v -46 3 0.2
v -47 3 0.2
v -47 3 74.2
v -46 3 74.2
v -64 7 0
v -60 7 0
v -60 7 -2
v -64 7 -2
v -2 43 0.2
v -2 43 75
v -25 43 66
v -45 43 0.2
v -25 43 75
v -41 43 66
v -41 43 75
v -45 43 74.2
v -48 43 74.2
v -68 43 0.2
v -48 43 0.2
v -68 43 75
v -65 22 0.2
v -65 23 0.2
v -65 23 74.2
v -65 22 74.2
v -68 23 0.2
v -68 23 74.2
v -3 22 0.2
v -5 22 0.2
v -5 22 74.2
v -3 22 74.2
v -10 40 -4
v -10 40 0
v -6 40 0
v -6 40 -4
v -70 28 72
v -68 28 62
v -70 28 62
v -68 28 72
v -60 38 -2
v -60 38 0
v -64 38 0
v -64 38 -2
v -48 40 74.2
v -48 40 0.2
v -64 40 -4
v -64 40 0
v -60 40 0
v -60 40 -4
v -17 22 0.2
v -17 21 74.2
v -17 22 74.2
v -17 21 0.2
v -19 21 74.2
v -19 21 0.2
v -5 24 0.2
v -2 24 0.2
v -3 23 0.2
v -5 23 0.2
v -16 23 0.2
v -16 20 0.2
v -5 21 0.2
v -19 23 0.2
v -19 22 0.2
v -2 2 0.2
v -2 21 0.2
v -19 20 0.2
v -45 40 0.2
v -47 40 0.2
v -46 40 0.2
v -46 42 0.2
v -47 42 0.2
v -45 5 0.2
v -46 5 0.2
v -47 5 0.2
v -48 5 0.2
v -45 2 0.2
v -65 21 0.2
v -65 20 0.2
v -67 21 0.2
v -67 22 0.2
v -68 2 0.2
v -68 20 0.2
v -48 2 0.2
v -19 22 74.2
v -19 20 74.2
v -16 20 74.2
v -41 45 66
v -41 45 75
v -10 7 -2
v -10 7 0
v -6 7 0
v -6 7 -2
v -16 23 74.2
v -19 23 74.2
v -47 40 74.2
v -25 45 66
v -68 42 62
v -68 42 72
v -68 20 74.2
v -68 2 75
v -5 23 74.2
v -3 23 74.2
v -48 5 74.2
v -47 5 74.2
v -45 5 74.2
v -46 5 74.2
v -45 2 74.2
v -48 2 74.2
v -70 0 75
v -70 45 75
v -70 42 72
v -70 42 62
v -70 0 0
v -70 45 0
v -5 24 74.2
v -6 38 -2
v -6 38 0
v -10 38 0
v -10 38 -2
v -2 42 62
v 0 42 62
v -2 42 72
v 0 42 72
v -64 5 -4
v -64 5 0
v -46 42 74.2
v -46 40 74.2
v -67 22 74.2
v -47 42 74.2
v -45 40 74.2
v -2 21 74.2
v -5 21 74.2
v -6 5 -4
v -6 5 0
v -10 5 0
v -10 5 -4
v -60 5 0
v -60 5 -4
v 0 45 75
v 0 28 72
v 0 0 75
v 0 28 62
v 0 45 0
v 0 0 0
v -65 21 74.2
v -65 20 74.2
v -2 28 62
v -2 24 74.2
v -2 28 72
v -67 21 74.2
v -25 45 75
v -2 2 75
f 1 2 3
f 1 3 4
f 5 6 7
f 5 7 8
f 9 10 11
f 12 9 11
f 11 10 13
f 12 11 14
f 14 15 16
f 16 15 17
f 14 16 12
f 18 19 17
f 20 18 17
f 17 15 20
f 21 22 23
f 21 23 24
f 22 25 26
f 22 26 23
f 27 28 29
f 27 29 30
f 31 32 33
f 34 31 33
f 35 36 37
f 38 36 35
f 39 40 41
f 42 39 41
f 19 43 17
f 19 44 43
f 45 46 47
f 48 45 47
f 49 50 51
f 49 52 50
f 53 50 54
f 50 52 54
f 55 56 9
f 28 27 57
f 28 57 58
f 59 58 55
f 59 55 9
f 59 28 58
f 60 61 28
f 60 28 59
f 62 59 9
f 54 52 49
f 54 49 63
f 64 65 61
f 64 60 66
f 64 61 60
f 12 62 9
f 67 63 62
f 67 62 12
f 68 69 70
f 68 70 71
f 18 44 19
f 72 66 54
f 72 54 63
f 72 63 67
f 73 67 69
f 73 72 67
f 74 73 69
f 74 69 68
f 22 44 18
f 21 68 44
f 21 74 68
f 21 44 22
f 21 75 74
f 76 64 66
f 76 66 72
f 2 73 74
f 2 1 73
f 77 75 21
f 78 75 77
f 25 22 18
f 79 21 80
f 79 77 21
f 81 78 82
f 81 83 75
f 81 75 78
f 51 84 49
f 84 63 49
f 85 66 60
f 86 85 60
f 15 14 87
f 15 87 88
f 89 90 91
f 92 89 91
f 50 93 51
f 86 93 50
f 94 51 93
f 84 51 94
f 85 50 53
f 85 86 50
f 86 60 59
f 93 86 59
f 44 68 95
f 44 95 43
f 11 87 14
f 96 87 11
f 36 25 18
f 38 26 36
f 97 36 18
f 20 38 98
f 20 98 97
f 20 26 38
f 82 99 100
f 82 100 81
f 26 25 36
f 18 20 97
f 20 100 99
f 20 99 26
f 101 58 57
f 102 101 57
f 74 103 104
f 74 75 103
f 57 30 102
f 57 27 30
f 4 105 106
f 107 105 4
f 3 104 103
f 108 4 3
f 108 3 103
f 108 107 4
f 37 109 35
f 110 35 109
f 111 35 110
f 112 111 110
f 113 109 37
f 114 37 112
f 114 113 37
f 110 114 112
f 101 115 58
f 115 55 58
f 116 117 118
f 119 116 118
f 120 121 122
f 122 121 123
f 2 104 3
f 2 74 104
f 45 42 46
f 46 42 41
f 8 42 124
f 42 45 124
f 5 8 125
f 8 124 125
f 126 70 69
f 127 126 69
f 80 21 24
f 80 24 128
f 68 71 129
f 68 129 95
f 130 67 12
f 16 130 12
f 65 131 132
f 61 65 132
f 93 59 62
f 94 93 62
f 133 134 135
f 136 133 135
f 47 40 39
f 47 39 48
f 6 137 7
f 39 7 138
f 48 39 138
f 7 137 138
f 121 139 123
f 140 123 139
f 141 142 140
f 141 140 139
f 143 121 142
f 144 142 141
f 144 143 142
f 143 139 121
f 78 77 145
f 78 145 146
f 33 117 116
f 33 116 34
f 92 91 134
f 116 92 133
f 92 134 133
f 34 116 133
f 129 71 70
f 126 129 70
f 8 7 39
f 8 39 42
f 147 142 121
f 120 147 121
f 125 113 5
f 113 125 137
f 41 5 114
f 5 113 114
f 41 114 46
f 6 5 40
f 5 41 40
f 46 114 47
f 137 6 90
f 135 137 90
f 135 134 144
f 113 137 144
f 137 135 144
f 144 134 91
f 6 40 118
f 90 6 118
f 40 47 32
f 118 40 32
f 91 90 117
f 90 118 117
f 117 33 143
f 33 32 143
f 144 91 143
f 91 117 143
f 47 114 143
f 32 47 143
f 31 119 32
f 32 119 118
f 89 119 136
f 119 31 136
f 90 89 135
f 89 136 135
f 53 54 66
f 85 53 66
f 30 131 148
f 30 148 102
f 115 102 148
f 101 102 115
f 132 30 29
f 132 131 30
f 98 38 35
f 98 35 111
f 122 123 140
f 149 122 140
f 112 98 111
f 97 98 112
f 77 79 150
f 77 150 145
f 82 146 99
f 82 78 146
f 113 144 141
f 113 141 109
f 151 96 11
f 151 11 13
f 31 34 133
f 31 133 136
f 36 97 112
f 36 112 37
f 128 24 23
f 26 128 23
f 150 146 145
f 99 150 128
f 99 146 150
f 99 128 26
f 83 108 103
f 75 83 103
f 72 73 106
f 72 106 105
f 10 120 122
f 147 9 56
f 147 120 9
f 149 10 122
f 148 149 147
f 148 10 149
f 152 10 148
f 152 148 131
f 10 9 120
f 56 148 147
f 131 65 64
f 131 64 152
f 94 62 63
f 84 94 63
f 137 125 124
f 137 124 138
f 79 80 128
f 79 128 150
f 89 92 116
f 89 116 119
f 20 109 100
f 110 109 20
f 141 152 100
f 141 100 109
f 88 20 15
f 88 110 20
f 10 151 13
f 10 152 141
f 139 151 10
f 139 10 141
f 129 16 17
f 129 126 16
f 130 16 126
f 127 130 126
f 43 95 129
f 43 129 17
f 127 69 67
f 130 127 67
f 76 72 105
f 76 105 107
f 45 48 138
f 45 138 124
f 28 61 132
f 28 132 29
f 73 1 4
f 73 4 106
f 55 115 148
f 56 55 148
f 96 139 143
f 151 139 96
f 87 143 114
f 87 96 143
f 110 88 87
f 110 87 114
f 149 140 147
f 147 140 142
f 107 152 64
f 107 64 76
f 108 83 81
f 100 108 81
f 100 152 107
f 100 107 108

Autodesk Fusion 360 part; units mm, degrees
sketch "Sketch1" plane through (0, 0, 0) normal (0, 0, 1) x (1, 0, 0)
  line L0 (0, 0) -> (-70, 0)
  line L1 (-70, 0) -> (-70, 45)
  line L2 (-70, 45) -> (0, 45)
  line L3 (0, 45) -> (0, 0)
extrude "Extrude1" add sketch "Sketch1" along normal blind 75
sketch "Sketch2" plane through (0, 0, 75) normal (0, 0, 1) x (-1, 0, 0)
  line L0 (0, -45) -> (70, -45)
  line L1 (70, -45) -> (70, 0)
  line L2 (70, 0) -> (0, 0)
  line L3 (0, 0) -> (0, -45)
  line L4 (68, -43) -> (2, -43)
  line L5 (2, -43) -> (2, -2)
  line L6 (2, -2) -> (68, -2)
  line L7 (68, -2) -> (68, -43)
extrude "Extrude2" cut sketch "Sketch2" against normal blind 74.8 contours L4 L5 L6 L7
sketch "Sketch3" plane through (0, 0, 0.2) normal (0, 0, 1) x (-1, 0, 0)
  line L0 (68, -2) -> (2, -2)
  line L1 (2, -2) -> (2, -43)
  line L2 (2, -43) -> (68, -43)
  line L3 (68, -43) -> (68, -2)
  line L4 (68, -21) -> (65, -21)
  line L5 (65, -21) -> (65, -20)
  line L6 (65, -20) -> (68, -20)
  line L7 (68, -20) -> (68, -21)
  line L8 (67, -21) -> (68, -21)
  line L9 (68, -21) -> (68, -22)
  line L10 (68, -22) -> (67, -22)
  line L11 (67, -22) -> (67, -21)
  line L12 (68, -23) -> (65, -23)
  line L13 (65, -23) -> (65, -22)
  line L14 (65, -22) -> (68, -22)
  line L15 (68, -22) -> (68, -23)
  line L16 (19, -22) -> (16, -22)
  line L17 (16, -22) -> (16, -23)
  line L18 (16, -23) -> (19, -23)
  line L19 (19, -23) -> (19, -22)
  line L20 (17, -22) -> (16, -22)
  line L21 (16, -22) -> (16, -21)
  line L22 (16, -21) -> (17, -21)
  line L23 (17, -21) -> (17, -22)
  line L24 (16, -21) -> (19, -21)
  line L25 (19, -21) -> (19, -20)
  line L26 (19, -20) -> (16, -20)
  line L27 (16, -20) -> (16, -21)
extrude "Extrude3" add sketch "Sketch3" along normal blind 74 contours L3 L4 L5 L6 L7 L8 | L3 L4 L8 L9 L10 L11 L14 | L3 L10 L12 L13 L14 L15 | L16 L17 L18 L19 L20 | L16 L20 L21 L22 L23 L24 | L22 L24 L25 L26 L27
sketch "Sketch4" plane through (-68, 0, 0) normal (1, 0, 0) x (0, 1, 0)
  line L0 (23, 74.2) -> (23, 0.2)
  line L1 (23, 0.2) -> (43, 0.2)
  line L2 (43, 0.2) -> (43, 75)
  line L3 (43, 75) -> (2, 75)
  line L4 (2, 75) -> (2, 0.2)
  line L5 (2, 0.2) -> (20, 0.2)
  line L6 (20, 0.2) -> (20, 74.2)
  line L7 (20, 74.2) -> (23, 74.2)
  line L8 (28, 72) -> (42, 72)
  line L9 (42, 72) -> (42, 62)
  line L10 (42, 62) -> (28, 62)
  line L11 (28, 62) -> (28, 72)
extrude "Extrude4" cut sketch "Sketch4" against normal blind 8 contours L8 L9 L10 L11
sketch "Sketch5" plane through (0, 0, 0) normal (1, 0, 0) x (0, 1, 0)
  line L0 (0, 0) -> (45, 0)
  line L1 (45, 0) -> (45, 75)
  line L2 (45, 75) -> (0, 75)
  line L3 (0, 75) -> (0, 0)
  line L4 (42, 72) -> (28, 72)
  line L5 (28, 72) -> (28, 62)
  line L6 (28, 62) -> (42, 62)
  line L7 (42, 62) -> (42, 72)
extrude "Extrude5" cut sketch "Sketch5" against normal blind 9 contours L4 L5 L6 L7
sketch "Sketch6" plane through (0, 43, 0) normal (0, -1, 0) x (1, 0, 0)
  line L0 (-2, 75) -> (-68, 75)
  line L1 (-68, 75) -> (-68, 0.2)
  line L2 (-68, 0.2) -> (-2, 0.2)
  line L3 (-2, 0.2) -> (-2, 75)
  line L4 (-41, 75) -> (-25, 75)
  line L5 (-25, 75) -> (-25, 66)
  line L6 (-25, 66) -> (-41, 66)
  line L7 (-41, 66) -> (-41, 75)
extrude "Extrude6" cut sketch "Sketch6" against normal blind 8 contours L0 L4 L5 L6 L7
sketch "Sketch7" plane through (0, 0, 0) normal (0, 0, -1) x (1, 0, 0)
  line L0 (-70, -45) -> (0, -45)
  line L1 (0, -45) -> (0, 0)
  line L2 (0, 0) -> (-70, 0)
  line L3 (-70, 0) -> (-70, -45)
  line L4 (-64, -5) -> (-60, -5)
  line L5 (-60, -5) -> (-60, -7)
  line L6 (-60, -7) -> (-64, -7)
  line L7 (-64, -7) -> (-64, -5)
  line L8 (-64, -40) -> (-60, -40)
  line L9 (-60, -40) -> (-60, -38)
  line L10 (-60, -38) -> (-64, -38)
  line L11 (-64, -38) -> (-64, -40)
  line L12 (-6, -5) -> (-10, -5)
  line L13 (-10, -5) -> (-10, -7)
  line L14 (-10, -7) -> (-6, -7)
  line L15 (-6, -7) -> (-6, -5)
  line L16 (-6, -38) -> (-10, -38)
  line L17 (-10, -38) -> (-10, -40)
  line L18 (-10, -40) -> (-6, -40)
  line L19 (-6, -40) -> (-6, -38)
extrude "Extrude7" add sketch "Sketch7" along normal blind 4 contours L4 L5 L6 L7 | L8 L9 L10 L11 | L12 L13 L14 L15 | L16 L17 L18 L19
sketch "Sketch8" plane through (0, 7, 0) normal (0, 1, 0) x (-1, 0, 0)
  line L0 (64, 0) -> (60, 0)
  line L1 (60, 0) -> (60, -4)
  line L2 (60, -4) -> (64, -4)
  line L3 (64, -4) -> (64, 0)
  line L4 (64, -4) -> (60, -4)
  line L5 (60, -4) -> (60, -2)
  line L6 (60, -2) -> (64, -2)
  line L7 (64, -2) -> (64, -4)
extrude "Extrude8" add sketch "Sketch8" along normal blind 31 contours L1 L2 L3 L4 L5 L6 L7
sketch "Sketch9" plane through (0, 7, 0) normal (0, 1, 0) x (-1, 0, 0)
  line L0 (10, 0) -> (6, 0)
  line L1 (6, 0) -> (6, -4)
  line L2 (6, -4) -> (10, -4)
  line L3 (10, -4) -> (10, 0)
  line L4 (10, -4) -> (6, -4)
  line L5 (6, -4) -> (6, -2)
  line L6 (6, -2) -> (10, -2)
  line L7 (10, -2) -> (10, -4)
extrude "Extrude9" add sketch "Sketch9" along normal blind 31 contours L1 L2 L3 L4 L5 L6 L7
sketch "Sketch10" plane through (0, 0, 0.2) normal (0, 0, 1) x (-1, 0, 0)
  line L0 (68, -23) -> (65, -23)
  line L1 (65, -23) -> (65, -22)
  line L2 (65, -22) -> (67, -22)
  line L3 (67, -22) -> (67, -21)
  line L4 (67, -21) -> (65, -21)
  line L5 (65, -21) -> (65, -20)
  line L6 (65, -20) -> (68, -20)
  line L7 (68, -20) -> (68, -2)
  line L8 (68, -2) -> (2, -2)
  line L9 (2, -2) -> (2, -43)
  line L10 (2, -43) -> (68, -43)
  line L11 (68, -43) -> (68, -23)
  line L12 (17, -21) -> (17, -22)
  line L13 (17, -22) -> (19, -22)
  line L14 (19, -22) -> (19, -23)
  line L15 (19, -23) -> (16, -23)
  line L16 (16, -23) -> (16, -20)
  line L17 (16, -20) -> (19, -20)
  line L18 (19, -20) -> (19, -21)
  line L19 (19, -21) -> (17, -21)
  line L20 (2, -21) -> (3, -21)
  line L21 (3, -21) -> (3, -24)
  line L22 (3, -24) -> (2, -24)
  line L23 (2, -24) -> (2, -21)
  line L24 (3, -24) -> (5, -24)
  line L25 (5, -24) -> (5, -23)
  line L26 (5, -23) -> (3, -23)
  line L27 (3, -23) -> (3, -24)
  line L28 (3, -21) -> (5, -21)
  line L29 (5, -21) -> (5, -22)
  line L30 (5, -22) -> (3, -22)
  line L31 (3, -22) -> (3, -21)
  line L32 (45, -43) -> (46, -43)
  line L33 (46, -43) -> (46, -40)
  line L34 (46, -40) -> (45, -40)
  line L35 (45, -40) -> (45, -43)
  line L36 (46, -43) -> (47, -43)
  line L37 (47, -43) -> (47, -42)
  line L38 (47, -42) -> (46, -42)
  line L39 (46, -42) -> (46, -43)
  line L40 (48, -43) -> (47, -43)
  line L41 (47, -43) -> (47, -40)
  line L42 (47, -40) -> (48, -40)
  line L43 (48, -40) -> (48, -43)
  line L44 (45, -2) -> (46, -2)
  line L45 (46, -2) -> (46, -5)
  line L46 (46, -5) -> (45, -5)
  line L47 (45, -5) -> (45, -2)
  line L48 (46, -2) -> (47, -2)
  line L49 (47, -2) -> (47, -3)
  line L50 (47, -3) -> (46, -3)
  line L51 (46, -3) -> (46, -2)
  line L52 (47, -2) -> (48, -2)
  line L53 (48, -2) -> (48, -5)
  line L54 (48, -5) -> (47, -5)
  line L55 (47, -5) -> (47, -2)
extrude "Extrude10" add sketch "Sketch10" along normal blind 74 contours L10 L37 L40 L41 L42 L43 | L10 L33 L36 L37 L38 L39 L41 | L10 L32 L33 L34 L35 L39 | L9 L20 L21 L22 L23 L27 L31 | L21 L24 L25 L26 L27 | L8 L49 L52 L53 L54 L55 | L21 L28 L29 L30 L31 | L8 L45 L48 L49 L50 L51 L55 | L8 L44 L45 L46 L47 L51
sketch "Sketch11" plane through (0, 45, 0) normal (0, 1, 0) x (-1, 0, 0)
  line L0 (25, 66) -> (25, 75)
  line L1 (41, 75) -> (41, 66)
  line L2 (41, 66) -> (25, 66)
  line L3 (0, 0) -> (70, 0)
  line L4 (70, 0) -> (70, 75)
  line L5 (25, 75) -> (0, 75)
  line L6 (0, 75) -> (0, 0)
  line L7 (25, 66) -> (21, 66)
  line L8 (21, 66) -> (21, 72)
  line L9 (21, 72) -> (25, 72)
  line L10 (25, 72) -> (25, 66)
  line L11 (70, 75) -> (41, 75)
extrude "Extrude11" cut sketch "Sketch11" against normal blind 4 contours L0 L7 L8 L9 L10
extrude "Extrude12" add sketch "Sketch11" against normal blind 2 contours L0 L7 L8 L9 L10
